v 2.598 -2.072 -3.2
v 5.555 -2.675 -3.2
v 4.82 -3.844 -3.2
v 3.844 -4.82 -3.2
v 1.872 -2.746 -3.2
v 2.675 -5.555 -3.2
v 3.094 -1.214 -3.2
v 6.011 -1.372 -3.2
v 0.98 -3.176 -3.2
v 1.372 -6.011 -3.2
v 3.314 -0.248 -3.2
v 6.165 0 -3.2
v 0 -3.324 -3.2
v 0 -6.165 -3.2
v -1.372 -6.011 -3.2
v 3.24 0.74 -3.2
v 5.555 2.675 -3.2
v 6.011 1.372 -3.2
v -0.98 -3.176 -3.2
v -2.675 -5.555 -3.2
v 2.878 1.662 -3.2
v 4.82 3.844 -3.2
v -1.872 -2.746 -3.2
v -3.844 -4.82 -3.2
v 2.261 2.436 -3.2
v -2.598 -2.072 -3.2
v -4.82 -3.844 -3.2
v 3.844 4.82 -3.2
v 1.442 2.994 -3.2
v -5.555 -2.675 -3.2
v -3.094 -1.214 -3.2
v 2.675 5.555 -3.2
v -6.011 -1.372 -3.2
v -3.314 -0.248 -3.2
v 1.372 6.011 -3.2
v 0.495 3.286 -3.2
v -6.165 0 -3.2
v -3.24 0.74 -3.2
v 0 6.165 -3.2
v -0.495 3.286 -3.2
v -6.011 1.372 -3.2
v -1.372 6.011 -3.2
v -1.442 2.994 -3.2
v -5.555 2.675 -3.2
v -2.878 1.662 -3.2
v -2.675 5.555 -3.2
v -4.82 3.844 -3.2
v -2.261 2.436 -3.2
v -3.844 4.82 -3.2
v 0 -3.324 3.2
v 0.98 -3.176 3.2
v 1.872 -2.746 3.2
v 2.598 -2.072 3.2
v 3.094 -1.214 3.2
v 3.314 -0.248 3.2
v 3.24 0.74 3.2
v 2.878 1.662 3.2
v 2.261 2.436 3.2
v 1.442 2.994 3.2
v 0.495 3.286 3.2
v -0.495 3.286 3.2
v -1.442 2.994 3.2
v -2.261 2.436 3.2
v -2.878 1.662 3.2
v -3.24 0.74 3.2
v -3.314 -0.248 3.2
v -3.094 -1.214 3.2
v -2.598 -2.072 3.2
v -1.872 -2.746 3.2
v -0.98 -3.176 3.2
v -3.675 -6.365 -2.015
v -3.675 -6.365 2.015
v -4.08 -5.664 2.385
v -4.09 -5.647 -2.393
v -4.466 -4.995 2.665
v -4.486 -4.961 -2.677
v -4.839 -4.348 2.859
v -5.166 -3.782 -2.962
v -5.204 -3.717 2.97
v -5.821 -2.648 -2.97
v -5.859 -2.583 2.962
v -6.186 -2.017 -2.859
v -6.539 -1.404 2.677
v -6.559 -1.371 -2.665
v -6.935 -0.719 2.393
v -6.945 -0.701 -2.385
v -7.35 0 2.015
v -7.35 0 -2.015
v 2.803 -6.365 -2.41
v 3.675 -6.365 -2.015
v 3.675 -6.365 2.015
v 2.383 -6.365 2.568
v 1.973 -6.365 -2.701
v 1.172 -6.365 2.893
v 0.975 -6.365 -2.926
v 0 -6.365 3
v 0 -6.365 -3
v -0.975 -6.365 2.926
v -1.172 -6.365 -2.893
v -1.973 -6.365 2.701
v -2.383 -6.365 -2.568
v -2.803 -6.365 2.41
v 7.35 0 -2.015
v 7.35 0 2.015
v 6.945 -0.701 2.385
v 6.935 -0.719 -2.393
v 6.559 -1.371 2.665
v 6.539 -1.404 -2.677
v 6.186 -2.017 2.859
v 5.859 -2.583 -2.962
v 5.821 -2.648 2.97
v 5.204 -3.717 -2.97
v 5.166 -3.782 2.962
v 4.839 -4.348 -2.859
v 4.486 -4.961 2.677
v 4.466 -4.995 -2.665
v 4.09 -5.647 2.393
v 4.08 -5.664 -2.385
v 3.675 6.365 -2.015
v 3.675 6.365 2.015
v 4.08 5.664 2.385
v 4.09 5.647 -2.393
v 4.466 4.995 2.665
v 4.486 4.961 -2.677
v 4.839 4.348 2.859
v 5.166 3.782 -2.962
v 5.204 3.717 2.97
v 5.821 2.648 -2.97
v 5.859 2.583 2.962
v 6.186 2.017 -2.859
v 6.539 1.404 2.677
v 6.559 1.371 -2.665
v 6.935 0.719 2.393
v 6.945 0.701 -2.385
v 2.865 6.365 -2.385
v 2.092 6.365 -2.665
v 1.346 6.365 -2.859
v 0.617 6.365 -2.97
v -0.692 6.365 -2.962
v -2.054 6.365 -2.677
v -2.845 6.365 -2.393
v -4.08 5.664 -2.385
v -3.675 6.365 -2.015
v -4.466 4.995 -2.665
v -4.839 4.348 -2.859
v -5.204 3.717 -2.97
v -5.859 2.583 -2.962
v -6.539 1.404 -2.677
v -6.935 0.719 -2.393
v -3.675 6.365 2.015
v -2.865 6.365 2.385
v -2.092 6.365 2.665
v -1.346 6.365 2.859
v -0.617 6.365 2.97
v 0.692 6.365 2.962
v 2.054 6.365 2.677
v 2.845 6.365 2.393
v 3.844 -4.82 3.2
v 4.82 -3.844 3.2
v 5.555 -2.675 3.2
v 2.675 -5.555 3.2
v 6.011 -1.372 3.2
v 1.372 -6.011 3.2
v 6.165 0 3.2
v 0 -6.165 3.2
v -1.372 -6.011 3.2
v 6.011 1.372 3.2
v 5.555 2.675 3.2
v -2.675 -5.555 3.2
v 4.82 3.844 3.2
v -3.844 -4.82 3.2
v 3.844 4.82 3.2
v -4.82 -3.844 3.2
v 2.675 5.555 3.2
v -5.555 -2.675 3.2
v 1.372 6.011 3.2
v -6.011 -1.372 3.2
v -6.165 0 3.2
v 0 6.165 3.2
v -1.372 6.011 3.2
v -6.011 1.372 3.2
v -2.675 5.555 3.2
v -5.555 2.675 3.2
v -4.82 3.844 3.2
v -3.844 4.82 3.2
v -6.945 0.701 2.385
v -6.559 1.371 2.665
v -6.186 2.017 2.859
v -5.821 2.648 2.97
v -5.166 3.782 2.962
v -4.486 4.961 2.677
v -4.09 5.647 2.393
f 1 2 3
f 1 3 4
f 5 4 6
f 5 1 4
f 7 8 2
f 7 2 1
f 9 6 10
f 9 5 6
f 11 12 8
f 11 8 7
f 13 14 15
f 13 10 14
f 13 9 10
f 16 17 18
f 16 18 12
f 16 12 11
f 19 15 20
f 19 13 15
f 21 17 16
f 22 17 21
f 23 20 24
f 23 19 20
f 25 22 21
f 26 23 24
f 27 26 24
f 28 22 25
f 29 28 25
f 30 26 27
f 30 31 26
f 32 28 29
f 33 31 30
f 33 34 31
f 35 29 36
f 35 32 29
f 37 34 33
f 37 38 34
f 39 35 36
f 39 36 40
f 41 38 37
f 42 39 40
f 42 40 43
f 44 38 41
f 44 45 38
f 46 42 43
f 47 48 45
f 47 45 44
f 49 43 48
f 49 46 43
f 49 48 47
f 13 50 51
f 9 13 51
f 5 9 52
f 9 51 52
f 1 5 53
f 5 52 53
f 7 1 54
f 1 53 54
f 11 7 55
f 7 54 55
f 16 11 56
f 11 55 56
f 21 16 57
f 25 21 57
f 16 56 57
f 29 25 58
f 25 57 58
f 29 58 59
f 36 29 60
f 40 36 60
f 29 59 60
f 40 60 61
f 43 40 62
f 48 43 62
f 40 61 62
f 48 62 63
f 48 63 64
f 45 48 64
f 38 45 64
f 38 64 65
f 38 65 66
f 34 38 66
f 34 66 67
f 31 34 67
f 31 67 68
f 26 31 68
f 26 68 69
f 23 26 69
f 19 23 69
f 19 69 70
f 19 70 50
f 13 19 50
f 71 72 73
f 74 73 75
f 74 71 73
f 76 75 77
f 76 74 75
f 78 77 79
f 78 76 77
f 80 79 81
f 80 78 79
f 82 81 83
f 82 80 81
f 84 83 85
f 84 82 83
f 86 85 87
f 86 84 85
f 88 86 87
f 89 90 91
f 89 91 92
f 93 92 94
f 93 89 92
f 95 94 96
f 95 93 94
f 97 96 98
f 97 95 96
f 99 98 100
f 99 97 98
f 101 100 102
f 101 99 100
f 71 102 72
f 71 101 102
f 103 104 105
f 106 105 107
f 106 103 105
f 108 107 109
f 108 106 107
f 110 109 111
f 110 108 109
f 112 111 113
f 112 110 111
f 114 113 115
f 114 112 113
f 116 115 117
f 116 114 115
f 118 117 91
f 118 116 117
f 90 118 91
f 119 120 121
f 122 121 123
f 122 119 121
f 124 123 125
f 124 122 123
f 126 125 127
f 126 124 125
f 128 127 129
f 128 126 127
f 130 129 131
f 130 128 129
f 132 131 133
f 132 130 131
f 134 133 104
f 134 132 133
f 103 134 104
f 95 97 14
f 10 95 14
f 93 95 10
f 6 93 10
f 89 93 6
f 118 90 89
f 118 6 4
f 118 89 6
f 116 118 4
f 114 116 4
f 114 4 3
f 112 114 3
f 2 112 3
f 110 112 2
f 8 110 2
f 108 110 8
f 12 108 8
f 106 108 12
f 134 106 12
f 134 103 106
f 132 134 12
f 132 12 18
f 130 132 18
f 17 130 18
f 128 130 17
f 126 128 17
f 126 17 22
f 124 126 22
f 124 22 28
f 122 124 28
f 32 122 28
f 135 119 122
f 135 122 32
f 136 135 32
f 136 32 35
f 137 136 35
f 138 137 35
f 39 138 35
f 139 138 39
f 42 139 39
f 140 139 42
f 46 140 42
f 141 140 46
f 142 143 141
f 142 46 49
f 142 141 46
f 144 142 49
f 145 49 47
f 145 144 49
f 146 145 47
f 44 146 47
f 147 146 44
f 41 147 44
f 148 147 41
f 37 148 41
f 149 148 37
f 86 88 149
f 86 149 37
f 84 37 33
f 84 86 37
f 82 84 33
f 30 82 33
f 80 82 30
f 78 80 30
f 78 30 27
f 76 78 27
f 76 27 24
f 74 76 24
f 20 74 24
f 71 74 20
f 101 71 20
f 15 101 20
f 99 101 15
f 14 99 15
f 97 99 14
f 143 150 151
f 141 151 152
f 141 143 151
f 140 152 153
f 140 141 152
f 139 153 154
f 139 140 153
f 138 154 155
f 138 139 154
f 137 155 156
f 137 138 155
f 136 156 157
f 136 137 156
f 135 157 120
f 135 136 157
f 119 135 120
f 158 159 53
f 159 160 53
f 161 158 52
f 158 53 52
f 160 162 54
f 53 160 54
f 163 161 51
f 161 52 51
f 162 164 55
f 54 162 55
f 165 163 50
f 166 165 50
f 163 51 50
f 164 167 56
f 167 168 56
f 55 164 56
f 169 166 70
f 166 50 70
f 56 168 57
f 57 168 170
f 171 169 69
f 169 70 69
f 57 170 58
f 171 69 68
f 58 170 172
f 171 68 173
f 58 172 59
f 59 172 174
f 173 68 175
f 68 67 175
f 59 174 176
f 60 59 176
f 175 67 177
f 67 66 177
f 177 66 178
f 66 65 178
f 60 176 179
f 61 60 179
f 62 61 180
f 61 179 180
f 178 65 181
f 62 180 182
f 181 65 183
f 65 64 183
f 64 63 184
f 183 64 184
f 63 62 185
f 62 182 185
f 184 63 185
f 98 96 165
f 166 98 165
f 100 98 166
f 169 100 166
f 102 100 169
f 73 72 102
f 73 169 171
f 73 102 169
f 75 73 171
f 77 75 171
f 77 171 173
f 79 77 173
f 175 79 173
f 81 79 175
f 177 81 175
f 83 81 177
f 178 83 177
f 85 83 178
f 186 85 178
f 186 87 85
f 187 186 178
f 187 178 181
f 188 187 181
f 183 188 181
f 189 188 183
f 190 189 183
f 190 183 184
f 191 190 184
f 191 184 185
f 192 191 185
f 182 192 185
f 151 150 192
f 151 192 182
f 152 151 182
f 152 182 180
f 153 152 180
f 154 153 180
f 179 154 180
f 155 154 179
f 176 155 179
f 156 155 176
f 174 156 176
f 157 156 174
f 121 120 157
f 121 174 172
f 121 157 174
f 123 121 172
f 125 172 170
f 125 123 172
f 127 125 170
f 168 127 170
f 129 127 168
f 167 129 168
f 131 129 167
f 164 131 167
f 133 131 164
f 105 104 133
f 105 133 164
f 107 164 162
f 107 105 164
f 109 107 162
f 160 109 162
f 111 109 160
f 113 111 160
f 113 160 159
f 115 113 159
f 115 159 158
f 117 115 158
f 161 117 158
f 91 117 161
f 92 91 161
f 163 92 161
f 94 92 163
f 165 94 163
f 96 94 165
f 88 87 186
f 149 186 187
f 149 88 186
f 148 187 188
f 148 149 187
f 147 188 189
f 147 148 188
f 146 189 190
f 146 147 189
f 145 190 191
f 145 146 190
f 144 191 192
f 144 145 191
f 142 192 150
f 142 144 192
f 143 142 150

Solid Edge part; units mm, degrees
sketch "Sketch1" plane through (0, 0, 0) normal (0, 0, 1) x (1, 0, 0)
  line L0 (-3.675, 6.3653) -> (3.675, 6.3653)
  line L1 (3.675, 6.3653) -> (7.35, 0)
  line L2 (7.35, 0) -> (3.675, -6.3653)
  line L3 (3.675, -6.3653) -> (-3.675, -6.3653)
  line L4 (-3.675, -6.3653) -> (-7.35, 0)
  line L5 (-7.35, 0) -> (-3.675, 6.3653)
extrude "Protrusion1" add sketch "Sketch1" along normal mid plane 6.4
sketch "Sketch2" plane through (0, -5.5125, 6.3) normal (-1, 0, 0) x (0, 1, 0)
  line L0 (-2.267, 7.8858) -> (0.5614, 10.7142)
  line L1 (-2.267, 7.8858) -> (-2.267, 4.7142)
  line L2 (-2.267, 4.7142) -> (0.5614, 1.8858)
revolve "RevolvedCutout1" cut sketch "Sketch2" angle 360 about axis through (0, 0, 0.5943) along (0, 0, -1) material side at (0, -6.4007, -3.0354)
hole "Hole_1" at (0, 0, 3.2) direction (0, 0, -1) diameter 6.647 end up to next
properties material "Stainless steel"
